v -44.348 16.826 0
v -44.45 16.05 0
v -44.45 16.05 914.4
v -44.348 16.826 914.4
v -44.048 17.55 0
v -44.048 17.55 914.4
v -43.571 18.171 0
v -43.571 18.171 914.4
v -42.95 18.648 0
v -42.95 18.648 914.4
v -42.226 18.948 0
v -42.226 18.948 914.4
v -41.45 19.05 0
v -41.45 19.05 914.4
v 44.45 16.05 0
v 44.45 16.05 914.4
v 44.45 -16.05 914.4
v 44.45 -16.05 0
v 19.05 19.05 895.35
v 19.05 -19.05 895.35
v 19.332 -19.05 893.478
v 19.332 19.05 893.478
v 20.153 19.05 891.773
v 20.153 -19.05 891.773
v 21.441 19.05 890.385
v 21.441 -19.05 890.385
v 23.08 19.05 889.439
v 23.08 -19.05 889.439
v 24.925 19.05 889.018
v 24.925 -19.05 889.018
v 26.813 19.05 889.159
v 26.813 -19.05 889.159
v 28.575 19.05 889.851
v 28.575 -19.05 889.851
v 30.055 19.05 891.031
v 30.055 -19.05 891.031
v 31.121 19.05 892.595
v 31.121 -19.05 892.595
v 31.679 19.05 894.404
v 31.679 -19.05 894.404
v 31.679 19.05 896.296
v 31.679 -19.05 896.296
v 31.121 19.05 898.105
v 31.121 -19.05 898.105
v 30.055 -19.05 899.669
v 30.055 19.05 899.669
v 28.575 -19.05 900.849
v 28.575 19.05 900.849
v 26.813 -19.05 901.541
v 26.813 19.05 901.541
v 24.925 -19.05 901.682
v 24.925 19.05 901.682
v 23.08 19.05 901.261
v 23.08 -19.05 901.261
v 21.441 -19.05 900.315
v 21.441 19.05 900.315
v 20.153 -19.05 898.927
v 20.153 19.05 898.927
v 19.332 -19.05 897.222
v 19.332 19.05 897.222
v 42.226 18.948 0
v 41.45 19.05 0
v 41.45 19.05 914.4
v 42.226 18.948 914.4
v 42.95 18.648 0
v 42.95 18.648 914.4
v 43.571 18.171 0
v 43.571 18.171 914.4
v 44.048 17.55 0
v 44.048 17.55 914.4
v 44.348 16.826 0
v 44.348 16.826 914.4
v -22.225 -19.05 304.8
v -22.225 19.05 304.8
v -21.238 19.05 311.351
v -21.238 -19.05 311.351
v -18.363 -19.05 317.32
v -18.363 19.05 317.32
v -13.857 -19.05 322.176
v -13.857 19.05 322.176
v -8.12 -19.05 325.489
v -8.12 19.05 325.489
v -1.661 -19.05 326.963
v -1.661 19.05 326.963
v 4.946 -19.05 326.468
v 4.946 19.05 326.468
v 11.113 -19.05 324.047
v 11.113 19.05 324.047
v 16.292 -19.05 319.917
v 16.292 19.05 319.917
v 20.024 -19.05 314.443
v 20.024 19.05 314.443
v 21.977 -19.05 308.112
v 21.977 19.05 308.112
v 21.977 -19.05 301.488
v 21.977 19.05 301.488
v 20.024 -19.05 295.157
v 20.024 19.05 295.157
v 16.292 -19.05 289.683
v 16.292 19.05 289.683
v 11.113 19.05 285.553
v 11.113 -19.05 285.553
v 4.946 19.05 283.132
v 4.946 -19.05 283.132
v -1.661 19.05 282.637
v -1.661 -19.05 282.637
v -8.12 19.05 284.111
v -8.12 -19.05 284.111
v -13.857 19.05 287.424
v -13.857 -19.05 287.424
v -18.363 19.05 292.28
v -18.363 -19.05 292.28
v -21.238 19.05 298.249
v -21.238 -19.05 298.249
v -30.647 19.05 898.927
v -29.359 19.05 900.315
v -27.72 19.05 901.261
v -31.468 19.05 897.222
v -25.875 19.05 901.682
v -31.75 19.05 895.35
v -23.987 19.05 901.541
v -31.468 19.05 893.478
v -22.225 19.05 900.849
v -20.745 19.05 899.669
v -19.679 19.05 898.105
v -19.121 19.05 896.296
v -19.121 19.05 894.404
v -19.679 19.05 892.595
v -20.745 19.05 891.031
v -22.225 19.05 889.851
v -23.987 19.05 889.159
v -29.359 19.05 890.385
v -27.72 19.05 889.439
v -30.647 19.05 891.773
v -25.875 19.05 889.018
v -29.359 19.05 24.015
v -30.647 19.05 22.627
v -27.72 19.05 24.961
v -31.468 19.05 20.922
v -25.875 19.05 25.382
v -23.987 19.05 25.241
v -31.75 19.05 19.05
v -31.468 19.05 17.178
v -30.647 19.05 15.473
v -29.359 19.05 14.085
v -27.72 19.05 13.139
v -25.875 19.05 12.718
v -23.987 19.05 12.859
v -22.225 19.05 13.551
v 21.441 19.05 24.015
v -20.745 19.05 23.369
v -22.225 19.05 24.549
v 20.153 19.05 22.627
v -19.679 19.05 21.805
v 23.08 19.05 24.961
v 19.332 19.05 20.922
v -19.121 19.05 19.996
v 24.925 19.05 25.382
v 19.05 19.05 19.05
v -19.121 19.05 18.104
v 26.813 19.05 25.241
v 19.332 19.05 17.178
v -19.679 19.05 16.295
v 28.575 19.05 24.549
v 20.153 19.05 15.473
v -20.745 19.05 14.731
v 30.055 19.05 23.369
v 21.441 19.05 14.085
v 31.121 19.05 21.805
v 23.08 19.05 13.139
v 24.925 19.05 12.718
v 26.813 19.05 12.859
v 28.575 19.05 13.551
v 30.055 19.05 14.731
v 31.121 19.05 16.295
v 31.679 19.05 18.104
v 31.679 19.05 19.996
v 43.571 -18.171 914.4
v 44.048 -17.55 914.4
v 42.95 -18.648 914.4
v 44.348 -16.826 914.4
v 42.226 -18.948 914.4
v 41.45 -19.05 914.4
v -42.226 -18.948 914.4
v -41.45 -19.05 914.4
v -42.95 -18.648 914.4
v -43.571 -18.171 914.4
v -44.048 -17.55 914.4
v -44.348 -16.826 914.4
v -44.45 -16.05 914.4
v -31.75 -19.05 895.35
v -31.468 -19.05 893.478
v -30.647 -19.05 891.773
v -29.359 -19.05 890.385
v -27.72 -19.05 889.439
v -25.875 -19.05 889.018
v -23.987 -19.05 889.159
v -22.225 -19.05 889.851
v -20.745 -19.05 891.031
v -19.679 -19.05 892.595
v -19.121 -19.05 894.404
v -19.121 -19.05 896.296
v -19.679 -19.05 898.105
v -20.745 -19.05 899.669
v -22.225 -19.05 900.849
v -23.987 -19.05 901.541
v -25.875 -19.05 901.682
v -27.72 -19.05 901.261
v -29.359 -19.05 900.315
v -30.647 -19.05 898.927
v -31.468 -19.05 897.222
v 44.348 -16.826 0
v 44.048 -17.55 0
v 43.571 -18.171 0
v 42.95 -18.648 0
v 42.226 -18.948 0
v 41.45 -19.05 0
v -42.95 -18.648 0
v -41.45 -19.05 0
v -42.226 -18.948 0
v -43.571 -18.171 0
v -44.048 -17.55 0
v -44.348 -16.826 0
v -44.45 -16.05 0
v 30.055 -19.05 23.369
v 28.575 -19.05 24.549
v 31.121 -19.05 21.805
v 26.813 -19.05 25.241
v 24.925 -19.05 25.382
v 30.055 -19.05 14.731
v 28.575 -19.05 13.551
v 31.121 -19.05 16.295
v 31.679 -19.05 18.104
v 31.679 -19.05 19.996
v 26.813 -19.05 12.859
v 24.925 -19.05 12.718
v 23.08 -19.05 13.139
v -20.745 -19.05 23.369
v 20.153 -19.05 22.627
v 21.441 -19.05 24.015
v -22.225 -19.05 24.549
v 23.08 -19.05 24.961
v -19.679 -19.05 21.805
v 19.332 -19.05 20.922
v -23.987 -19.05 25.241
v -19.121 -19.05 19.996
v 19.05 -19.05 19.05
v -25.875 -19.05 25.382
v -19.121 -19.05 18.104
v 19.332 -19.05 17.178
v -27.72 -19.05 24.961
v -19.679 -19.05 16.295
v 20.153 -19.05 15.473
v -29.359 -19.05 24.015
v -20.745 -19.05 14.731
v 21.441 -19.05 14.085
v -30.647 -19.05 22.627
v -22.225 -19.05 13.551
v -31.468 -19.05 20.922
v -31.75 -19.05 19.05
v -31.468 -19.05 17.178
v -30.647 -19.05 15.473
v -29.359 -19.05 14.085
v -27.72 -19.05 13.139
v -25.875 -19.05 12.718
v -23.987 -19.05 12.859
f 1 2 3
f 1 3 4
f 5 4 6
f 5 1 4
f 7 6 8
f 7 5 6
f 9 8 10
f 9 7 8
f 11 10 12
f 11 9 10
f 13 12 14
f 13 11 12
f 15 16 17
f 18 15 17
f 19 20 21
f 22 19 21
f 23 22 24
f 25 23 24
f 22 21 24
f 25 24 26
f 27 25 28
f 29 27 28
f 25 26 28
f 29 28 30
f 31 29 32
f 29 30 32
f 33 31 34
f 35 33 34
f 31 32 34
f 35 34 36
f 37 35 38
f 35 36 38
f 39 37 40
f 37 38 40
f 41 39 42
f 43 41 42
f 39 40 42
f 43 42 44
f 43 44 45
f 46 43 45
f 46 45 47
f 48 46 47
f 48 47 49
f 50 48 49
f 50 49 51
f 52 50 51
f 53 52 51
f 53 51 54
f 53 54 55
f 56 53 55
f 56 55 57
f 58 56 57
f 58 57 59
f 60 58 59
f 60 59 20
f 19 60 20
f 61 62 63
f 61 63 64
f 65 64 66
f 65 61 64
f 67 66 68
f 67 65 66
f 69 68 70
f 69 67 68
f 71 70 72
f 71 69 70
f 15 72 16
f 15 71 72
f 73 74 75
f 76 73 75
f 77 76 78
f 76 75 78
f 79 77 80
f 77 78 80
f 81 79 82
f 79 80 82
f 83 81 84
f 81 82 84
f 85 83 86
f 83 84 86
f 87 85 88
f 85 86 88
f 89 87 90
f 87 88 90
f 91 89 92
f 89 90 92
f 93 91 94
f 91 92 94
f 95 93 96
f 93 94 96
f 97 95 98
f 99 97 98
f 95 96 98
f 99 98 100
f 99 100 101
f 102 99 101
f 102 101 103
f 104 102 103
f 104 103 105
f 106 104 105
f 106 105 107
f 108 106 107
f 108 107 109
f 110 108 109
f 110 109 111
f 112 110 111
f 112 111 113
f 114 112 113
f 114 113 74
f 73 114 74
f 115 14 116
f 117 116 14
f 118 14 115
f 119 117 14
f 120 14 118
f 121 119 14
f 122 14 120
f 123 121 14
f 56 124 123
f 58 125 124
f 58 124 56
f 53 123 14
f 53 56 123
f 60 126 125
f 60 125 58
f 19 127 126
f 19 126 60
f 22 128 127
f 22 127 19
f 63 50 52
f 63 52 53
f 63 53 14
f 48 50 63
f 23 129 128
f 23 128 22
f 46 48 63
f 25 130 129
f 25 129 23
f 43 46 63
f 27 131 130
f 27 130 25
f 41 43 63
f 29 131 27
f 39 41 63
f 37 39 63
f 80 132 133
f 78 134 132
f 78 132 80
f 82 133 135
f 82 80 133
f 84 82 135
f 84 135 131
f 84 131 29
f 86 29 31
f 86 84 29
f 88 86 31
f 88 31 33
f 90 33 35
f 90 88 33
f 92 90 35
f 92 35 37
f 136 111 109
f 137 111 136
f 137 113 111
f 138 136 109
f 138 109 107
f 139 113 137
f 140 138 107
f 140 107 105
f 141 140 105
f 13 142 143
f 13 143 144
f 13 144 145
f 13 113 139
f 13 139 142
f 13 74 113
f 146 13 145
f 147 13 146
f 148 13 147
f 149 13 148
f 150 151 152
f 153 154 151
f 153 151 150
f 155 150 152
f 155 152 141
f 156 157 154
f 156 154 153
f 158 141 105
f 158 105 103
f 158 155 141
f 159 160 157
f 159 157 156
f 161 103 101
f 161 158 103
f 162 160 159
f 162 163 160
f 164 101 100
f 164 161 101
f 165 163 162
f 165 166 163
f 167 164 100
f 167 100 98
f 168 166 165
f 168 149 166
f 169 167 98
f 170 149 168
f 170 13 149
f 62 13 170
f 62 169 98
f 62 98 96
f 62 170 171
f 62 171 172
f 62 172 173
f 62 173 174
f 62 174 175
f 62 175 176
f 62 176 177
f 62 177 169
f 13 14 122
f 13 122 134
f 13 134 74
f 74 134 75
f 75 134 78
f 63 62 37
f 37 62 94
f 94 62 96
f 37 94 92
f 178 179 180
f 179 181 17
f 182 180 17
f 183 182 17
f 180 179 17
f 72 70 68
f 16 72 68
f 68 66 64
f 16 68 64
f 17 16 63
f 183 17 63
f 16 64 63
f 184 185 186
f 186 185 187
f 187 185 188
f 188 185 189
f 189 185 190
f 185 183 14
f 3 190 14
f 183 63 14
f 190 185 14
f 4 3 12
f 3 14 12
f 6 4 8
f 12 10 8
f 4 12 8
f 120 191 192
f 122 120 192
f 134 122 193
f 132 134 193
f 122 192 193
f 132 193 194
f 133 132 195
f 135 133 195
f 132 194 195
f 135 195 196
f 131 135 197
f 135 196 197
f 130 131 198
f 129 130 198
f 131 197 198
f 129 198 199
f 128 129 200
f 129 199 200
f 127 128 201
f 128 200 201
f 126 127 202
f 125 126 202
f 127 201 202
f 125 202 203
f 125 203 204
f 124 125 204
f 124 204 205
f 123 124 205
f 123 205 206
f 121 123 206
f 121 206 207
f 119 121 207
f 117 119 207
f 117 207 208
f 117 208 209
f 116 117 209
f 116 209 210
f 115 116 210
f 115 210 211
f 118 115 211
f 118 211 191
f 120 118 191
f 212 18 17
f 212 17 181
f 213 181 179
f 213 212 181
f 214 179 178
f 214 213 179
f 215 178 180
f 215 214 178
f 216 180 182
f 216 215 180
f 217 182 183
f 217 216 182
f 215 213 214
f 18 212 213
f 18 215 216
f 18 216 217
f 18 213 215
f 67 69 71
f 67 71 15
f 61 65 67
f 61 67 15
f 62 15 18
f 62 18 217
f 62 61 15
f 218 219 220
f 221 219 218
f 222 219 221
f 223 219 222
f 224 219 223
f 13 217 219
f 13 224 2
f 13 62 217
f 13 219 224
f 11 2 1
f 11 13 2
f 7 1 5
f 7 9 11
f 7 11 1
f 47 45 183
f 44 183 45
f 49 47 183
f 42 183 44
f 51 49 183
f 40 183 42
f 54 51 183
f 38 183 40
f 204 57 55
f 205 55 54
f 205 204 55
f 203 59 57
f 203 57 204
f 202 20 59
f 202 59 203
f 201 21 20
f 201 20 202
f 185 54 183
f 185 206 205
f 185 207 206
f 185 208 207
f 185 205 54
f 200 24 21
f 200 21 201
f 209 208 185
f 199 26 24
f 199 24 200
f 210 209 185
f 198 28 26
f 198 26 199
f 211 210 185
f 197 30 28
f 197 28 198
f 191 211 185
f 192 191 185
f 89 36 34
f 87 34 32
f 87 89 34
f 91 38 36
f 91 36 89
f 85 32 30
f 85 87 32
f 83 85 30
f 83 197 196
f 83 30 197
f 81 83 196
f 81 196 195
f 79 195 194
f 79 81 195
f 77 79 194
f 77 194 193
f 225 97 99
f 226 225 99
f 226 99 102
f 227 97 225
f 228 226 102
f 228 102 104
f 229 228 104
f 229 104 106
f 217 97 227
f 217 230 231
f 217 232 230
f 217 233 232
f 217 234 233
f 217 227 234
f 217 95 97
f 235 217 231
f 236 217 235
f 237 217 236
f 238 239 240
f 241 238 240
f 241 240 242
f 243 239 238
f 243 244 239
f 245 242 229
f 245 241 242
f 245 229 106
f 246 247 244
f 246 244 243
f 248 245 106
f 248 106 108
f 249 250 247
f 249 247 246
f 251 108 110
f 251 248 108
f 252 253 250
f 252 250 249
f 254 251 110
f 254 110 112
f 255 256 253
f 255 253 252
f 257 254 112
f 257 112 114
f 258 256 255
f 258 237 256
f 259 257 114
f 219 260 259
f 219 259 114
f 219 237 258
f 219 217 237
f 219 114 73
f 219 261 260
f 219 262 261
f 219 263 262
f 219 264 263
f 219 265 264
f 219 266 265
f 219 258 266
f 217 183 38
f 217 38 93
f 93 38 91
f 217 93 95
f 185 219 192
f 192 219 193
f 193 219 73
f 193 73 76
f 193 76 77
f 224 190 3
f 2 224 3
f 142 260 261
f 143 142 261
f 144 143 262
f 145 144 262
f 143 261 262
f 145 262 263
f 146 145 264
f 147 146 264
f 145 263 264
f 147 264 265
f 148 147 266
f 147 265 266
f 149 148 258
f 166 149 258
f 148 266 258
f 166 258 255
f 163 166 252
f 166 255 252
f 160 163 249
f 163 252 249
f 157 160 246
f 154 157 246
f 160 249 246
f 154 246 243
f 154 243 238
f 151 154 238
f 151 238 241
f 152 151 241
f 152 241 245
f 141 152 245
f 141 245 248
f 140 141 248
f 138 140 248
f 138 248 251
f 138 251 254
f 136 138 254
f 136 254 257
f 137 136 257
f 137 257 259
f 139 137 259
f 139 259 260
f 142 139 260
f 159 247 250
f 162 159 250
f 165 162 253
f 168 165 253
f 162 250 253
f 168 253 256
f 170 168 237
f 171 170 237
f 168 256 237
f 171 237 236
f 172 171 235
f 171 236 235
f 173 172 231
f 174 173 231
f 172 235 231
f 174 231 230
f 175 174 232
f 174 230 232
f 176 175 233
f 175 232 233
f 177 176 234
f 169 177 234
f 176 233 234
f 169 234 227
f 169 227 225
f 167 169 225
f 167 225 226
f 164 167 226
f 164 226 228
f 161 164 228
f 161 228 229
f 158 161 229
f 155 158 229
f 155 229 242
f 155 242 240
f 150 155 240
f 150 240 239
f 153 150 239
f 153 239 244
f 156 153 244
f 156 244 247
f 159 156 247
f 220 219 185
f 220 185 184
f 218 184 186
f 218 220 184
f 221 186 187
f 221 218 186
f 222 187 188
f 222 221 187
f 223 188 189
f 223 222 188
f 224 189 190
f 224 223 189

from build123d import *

# Parameters (mm, degrees)
BOSS_EXTRUDE1_DEPTH        = 914.4
SKETCH2_R                  = 22.225
CUT_EXTRUDE1_DEPTH         = 917.272215283
F_1_2_0_5_DIAMETER_HOLE1_D = 12.7


with BuildPart() as part:
    # Sketch1 → Boss-Extrude1 (new body)
    with BuildSketch(Plane.XY):
        with BuildLine():
            Line((41.45, -19.05), (-41.45, -19.05))
            ThreePointArc((-41.45, -19.05), (-43.571320344, -18.171320344), (-44.45, -16.05))
            Line((-44.45, -16.05), (-44.45, 16.05))
            ThreePointArc((-44.45, 16.05), (-43.571320344, 18.171320344), (-41.45, 19.05))
            Line((-41.45, 19.05), (41.45, 19.05))
            ThreePointArc((41.45, 19.05), (43.571320344, 18.171320344), (44.45, 16.05))
            Line((44.45, 16.05), (44.45, -16.05))
            ThreePointArc((44.45, -16.05), (43.571320344, -18.171320344), (41.45, -19.05))
        make_face()
    extrude(amount=BOSS_EXTRUDE1_DEPTH)

    # Sketch2 → Cut-Extrude1 (cut, through all)
    with BuildSketch(Plane(origin=(0, 19.05, 0), x_dir=(1, 0, 0), z_dir=(0, 1, 0))):
        with Locations(Location((0, -304.8, 0), (0, 0, 180))):
            Circle(SKETCH2_R)
    extrude(amount=-CUT_EXTRUDE1_DEPTH, mode=Mode.SUBTRACT)

    # 1/2 (0.5) Diameter Hole1 (through all)
    with Locations(Plane(origin=(0, 19.05, 0), x_dir=(1, 0, 0), z_dir=(0, 1, 0))):
        with Locations((-25.4, -895.35), (25.4, -895.35), (-25.4, -19.05), (25.4, -19.05)):
            Hole(F_1_2_0_5_DIAMETER_HOLE1_D / 2)


solid = part.part
